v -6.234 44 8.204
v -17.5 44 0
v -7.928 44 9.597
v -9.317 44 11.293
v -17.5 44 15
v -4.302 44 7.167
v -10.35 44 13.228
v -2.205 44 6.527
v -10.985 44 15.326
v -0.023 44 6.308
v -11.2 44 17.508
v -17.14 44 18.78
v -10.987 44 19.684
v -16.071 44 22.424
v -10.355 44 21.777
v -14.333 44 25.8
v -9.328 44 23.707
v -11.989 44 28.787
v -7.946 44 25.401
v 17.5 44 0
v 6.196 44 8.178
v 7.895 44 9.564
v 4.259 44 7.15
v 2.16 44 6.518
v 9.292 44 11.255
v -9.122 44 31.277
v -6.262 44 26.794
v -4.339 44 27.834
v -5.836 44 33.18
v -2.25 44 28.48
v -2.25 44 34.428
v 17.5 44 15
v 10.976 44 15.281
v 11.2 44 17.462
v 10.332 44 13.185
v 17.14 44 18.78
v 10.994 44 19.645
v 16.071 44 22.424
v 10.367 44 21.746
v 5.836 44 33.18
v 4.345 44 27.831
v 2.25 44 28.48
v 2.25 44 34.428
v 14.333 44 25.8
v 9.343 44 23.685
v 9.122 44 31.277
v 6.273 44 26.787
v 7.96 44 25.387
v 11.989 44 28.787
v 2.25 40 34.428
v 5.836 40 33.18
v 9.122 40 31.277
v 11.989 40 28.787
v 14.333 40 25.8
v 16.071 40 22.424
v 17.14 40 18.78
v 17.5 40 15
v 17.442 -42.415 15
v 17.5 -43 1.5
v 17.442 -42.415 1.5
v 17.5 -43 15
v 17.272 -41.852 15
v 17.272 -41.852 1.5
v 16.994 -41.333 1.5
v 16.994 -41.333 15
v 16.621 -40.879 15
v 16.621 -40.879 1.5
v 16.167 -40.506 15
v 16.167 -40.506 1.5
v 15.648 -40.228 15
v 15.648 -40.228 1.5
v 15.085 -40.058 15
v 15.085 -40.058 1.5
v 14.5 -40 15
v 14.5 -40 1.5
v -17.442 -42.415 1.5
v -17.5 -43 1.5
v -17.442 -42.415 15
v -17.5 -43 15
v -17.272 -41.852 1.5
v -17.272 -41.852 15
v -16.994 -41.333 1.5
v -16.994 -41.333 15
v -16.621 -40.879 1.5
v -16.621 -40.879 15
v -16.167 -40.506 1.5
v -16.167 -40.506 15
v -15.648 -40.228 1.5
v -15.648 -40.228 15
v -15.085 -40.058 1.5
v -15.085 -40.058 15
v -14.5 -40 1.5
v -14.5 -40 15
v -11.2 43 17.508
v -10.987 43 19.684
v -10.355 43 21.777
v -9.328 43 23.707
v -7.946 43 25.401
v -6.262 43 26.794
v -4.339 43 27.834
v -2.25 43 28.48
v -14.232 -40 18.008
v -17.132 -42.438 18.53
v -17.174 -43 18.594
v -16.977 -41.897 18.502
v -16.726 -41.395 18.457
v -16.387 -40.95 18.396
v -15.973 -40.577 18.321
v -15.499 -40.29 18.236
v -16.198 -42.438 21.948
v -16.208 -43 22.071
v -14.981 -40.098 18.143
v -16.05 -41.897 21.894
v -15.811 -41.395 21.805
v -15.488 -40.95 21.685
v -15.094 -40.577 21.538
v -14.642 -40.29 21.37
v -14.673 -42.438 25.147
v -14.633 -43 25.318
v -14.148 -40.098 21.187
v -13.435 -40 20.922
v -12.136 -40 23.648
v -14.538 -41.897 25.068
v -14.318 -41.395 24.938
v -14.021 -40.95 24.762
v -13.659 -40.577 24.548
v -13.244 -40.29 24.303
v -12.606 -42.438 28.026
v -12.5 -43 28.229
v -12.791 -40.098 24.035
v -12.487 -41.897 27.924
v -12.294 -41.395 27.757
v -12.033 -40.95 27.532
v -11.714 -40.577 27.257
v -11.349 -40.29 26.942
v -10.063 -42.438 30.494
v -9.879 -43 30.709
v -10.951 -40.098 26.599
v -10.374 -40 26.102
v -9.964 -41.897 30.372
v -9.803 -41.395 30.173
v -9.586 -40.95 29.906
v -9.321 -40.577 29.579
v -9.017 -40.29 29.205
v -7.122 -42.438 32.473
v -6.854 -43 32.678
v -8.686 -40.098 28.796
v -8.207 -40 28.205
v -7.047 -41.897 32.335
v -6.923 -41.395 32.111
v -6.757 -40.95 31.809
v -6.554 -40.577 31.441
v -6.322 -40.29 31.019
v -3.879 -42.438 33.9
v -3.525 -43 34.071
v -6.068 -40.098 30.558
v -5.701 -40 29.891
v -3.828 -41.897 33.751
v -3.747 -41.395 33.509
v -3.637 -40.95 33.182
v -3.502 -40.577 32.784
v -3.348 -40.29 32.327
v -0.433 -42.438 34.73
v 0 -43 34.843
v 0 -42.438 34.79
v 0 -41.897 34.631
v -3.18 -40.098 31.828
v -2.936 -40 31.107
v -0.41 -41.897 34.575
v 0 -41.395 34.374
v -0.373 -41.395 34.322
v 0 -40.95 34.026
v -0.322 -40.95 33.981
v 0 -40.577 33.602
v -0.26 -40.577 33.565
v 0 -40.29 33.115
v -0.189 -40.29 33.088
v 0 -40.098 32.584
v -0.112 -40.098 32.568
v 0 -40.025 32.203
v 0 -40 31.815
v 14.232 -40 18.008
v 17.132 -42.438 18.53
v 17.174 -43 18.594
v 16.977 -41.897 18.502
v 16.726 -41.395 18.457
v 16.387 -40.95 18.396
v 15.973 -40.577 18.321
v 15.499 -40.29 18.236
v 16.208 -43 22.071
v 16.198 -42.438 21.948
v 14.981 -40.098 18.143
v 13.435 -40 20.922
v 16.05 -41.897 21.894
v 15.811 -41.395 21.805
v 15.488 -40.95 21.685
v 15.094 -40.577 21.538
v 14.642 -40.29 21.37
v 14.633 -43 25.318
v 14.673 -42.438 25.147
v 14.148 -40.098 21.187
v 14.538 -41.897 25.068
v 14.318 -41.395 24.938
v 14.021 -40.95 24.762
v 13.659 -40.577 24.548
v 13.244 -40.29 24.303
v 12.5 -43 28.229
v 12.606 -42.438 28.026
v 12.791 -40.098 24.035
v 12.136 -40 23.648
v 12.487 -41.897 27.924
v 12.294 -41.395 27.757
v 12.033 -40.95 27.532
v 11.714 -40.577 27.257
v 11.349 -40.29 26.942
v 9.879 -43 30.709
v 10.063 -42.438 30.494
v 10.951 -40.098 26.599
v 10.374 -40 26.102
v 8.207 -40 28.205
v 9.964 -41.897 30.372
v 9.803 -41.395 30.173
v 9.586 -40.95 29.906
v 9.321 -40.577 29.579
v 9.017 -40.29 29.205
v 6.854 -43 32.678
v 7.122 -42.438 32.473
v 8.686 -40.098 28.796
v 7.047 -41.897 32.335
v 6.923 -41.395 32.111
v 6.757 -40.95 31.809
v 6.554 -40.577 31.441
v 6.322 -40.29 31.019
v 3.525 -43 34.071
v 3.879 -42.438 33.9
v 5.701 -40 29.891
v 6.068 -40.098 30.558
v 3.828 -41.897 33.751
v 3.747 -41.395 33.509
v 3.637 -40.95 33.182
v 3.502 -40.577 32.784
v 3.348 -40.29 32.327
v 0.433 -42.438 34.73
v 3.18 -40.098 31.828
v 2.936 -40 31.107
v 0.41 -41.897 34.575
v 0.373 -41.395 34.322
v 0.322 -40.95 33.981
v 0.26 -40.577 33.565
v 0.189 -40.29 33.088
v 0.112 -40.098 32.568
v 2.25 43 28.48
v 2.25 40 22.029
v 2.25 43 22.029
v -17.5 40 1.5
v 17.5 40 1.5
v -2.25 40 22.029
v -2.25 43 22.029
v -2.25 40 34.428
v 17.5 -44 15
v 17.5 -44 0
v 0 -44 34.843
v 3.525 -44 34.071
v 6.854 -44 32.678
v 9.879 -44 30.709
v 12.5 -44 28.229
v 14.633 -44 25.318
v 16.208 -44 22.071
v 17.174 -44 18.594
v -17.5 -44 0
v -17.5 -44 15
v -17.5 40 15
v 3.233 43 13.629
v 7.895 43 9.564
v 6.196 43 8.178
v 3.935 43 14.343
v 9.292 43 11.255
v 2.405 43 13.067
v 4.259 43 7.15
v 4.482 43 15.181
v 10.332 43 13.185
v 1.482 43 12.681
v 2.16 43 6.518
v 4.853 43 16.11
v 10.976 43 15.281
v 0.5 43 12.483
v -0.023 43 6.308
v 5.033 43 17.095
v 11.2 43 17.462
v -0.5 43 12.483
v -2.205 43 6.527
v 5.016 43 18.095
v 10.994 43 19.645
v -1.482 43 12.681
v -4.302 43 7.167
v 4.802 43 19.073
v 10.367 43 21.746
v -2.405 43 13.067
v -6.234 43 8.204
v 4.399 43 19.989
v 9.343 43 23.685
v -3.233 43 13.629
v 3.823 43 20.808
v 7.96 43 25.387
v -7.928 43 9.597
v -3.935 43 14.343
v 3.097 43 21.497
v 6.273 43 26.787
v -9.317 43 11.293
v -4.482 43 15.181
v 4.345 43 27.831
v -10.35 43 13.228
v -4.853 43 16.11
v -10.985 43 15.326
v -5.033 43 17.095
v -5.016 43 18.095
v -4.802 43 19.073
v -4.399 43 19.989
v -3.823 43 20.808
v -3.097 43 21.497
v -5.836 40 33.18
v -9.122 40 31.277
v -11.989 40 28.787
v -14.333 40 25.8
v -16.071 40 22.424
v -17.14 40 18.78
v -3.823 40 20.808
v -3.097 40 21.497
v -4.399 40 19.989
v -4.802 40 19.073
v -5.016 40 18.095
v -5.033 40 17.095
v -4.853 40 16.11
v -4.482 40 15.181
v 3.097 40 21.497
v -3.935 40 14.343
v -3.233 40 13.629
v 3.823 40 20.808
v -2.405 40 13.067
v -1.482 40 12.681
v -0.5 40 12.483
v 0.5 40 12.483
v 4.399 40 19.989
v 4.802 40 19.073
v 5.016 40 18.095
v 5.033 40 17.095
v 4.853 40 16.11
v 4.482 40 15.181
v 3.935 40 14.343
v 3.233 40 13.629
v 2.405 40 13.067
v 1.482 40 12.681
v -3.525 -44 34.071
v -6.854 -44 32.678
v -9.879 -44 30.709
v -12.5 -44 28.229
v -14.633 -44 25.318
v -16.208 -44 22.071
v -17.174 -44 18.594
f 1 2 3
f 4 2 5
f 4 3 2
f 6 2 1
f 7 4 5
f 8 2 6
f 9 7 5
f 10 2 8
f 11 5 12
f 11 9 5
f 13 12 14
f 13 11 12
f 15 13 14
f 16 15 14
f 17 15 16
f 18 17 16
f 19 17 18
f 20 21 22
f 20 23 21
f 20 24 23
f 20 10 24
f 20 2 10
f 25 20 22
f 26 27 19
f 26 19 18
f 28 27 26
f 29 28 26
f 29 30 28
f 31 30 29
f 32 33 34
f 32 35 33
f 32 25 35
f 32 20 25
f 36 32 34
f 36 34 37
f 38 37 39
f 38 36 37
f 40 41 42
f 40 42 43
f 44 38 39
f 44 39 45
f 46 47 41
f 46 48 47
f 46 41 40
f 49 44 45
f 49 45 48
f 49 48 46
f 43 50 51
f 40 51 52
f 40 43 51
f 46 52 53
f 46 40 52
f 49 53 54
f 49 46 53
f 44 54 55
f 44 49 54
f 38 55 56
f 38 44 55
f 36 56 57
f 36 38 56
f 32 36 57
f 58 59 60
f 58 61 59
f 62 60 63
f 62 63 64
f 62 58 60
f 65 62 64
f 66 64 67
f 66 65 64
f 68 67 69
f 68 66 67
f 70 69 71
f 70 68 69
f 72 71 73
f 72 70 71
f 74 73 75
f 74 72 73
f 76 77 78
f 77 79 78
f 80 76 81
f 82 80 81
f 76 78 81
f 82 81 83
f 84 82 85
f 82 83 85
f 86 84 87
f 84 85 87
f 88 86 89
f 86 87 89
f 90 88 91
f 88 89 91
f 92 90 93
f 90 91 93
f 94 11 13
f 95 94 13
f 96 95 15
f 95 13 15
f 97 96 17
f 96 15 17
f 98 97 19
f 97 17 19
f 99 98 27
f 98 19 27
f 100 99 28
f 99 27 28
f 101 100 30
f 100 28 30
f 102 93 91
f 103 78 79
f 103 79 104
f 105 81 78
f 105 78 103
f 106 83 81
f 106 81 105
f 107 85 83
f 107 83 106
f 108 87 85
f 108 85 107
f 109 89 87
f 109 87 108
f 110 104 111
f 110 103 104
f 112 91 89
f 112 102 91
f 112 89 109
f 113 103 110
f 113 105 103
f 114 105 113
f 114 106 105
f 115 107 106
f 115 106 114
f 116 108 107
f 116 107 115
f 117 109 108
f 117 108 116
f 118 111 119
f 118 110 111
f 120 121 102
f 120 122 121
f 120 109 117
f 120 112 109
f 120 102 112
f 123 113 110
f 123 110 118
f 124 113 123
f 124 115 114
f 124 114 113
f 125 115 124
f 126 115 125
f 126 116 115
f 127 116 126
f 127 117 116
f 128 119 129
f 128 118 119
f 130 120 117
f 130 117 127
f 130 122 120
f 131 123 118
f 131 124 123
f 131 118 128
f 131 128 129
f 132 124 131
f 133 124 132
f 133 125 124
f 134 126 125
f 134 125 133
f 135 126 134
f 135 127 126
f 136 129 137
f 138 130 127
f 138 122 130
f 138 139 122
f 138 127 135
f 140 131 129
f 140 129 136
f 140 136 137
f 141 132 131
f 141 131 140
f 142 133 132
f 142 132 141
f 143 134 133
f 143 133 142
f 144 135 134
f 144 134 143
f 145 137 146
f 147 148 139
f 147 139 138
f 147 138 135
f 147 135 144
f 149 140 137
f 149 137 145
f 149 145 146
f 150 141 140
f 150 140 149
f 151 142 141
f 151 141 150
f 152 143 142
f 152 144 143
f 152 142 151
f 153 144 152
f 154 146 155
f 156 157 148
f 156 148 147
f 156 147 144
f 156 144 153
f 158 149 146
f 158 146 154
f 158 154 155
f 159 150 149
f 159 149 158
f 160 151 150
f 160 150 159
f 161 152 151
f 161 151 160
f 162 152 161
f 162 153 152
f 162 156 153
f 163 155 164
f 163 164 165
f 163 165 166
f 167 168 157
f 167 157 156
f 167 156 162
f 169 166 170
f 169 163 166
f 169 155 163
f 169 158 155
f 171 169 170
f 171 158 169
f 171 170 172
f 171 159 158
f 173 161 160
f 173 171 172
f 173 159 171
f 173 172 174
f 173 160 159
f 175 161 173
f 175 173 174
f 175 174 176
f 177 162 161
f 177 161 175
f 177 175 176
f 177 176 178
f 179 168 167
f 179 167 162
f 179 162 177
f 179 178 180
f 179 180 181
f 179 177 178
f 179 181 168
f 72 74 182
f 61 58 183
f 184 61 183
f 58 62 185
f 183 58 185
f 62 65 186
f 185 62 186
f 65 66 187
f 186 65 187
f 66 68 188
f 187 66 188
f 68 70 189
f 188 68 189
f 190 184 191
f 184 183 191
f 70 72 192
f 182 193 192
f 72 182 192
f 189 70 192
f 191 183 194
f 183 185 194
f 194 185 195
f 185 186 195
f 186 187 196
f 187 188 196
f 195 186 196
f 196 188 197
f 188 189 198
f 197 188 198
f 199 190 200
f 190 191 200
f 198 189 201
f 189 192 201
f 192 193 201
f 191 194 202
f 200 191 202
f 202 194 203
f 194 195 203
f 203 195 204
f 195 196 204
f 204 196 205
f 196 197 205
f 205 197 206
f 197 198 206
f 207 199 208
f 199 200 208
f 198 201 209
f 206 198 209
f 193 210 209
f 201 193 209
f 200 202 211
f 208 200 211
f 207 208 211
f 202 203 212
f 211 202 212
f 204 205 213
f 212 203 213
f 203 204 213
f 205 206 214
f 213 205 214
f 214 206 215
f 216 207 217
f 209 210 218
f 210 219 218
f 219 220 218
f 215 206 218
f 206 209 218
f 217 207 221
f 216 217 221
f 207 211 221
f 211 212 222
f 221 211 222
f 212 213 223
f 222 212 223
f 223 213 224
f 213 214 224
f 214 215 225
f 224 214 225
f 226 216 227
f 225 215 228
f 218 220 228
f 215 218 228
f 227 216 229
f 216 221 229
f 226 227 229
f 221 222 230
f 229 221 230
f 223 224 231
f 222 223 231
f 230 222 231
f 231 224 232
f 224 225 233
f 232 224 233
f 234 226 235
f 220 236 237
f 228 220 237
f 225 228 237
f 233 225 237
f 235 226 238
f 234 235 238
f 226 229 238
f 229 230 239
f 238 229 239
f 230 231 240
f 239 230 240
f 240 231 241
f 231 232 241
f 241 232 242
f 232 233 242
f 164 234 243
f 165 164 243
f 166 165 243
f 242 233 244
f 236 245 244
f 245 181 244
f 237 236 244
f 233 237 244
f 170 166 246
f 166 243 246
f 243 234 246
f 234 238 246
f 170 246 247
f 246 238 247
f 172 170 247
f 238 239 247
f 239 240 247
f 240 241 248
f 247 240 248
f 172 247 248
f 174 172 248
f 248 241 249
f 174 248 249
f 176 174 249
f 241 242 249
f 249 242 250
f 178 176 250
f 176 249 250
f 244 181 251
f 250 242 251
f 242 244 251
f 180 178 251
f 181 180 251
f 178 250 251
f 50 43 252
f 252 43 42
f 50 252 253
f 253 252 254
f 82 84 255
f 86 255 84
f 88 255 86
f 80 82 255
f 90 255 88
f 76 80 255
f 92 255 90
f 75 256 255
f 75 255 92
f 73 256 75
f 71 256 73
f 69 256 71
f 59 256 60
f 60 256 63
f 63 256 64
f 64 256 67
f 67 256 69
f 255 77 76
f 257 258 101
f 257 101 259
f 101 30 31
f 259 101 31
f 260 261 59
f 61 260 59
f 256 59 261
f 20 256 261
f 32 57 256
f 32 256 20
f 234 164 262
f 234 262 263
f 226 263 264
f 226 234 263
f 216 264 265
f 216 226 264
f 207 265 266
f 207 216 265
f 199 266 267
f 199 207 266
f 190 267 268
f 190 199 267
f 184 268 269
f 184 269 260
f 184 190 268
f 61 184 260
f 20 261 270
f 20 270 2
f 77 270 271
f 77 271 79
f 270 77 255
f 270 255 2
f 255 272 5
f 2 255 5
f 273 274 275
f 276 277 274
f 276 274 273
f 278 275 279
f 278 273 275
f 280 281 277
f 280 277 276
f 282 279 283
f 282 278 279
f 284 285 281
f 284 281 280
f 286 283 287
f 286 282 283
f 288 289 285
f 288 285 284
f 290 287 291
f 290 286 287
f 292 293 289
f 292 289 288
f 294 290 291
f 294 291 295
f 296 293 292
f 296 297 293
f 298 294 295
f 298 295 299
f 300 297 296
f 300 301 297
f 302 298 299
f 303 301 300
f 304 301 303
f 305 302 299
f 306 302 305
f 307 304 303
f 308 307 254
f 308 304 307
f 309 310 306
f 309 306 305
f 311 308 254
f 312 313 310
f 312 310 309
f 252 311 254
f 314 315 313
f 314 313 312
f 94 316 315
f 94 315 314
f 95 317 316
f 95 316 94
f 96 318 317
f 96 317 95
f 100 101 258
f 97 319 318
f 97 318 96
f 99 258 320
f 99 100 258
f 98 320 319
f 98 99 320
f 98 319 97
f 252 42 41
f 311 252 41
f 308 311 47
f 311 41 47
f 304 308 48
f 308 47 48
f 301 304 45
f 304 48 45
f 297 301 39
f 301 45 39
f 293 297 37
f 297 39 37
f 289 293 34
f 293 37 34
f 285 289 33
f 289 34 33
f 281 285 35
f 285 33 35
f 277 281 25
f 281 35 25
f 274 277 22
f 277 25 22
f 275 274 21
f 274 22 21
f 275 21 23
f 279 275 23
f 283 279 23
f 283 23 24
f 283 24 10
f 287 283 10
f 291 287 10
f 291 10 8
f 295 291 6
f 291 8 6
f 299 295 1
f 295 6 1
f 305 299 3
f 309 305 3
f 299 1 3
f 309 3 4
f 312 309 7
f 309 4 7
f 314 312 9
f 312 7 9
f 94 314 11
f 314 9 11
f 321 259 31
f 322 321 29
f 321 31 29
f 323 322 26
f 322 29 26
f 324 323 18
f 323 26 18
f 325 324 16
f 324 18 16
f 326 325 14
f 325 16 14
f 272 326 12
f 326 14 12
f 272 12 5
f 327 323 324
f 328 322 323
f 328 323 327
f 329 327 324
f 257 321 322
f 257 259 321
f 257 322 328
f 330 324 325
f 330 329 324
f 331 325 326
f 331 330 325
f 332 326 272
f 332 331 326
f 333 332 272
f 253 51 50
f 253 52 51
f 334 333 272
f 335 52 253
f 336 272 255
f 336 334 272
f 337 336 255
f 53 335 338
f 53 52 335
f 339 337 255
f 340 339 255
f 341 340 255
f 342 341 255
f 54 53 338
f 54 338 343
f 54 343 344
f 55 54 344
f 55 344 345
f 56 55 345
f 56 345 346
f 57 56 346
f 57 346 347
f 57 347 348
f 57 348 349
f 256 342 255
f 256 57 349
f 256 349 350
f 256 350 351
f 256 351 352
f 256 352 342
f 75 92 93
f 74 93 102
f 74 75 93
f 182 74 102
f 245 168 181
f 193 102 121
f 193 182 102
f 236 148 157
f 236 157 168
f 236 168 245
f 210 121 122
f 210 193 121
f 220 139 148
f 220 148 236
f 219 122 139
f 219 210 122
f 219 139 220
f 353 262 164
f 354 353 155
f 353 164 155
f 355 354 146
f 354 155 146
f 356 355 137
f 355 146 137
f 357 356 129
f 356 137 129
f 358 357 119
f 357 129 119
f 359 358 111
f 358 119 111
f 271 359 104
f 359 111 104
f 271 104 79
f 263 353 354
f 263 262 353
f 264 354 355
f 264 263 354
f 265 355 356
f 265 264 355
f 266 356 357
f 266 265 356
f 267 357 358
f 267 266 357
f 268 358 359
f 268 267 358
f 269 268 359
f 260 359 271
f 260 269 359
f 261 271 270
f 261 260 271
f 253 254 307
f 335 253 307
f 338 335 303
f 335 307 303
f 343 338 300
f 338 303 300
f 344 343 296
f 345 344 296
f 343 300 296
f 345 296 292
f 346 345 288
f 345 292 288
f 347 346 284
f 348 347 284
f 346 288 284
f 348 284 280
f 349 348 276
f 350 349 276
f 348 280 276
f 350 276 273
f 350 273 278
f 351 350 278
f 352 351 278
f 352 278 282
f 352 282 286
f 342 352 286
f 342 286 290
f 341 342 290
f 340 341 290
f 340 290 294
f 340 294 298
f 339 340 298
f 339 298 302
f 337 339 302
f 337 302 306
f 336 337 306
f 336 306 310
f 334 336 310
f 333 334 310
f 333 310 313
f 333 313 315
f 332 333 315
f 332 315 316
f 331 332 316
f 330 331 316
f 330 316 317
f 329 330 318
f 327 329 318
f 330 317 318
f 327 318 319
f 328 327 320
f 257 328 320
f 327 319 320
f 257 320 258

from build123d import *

# Parameters (mm, degrees)
F1_DEPTH    = 17.5
F2_T1_DEPTH = 104
F2_T3_DEPTH = 104
F4_DEPTH    = 1
F5_DEPTH    = 25
F6_R        = 3


# Not quite as in the source:
# - a fillet or chamfer that OpenCascade refuses, or shapes differently, is made with other operations: its cross-section is extruded or revolved along the edge and cut away or added


with BuildPart() as f1:
    # F0 (on Right) → F1 (new body, symmetric)
    with BuildSketch(Plane.YZ):
        Polygon((-44, 35), (-44, 0), (44, 0), (44, 35), (40, 35), (40, 1.5), (-40, 1.5), (-40, 35), align=None)
    extrude(amount=F1_DEPTH, both=True)

    # F2: fillet of radius 20 on 4 edges, made by hand

    # F2_s2 → F2_t1 (cut)
    with BuildSketch(Plane.XZ.offset(-94)):
        with BuildLine():
            ThreePointArc((-2.5, 35), (11.6421356237, 29.1421356237), (17.5, 15))
            Line((17.5, 15), (17.5, 35))
            Line((17.5, 35), (-2.5, 35))
        make_face()
        with BuildLine():
            ThreePointArc((2.5, 35), (-11.6421356237, 29.1421356237), (-17.5, 15))
            Line((-17.5, 15), (-17.5, 35))
            Line((-17.5, 35), (2.5, 35))
        make_face()
    extrude(amount=F2_T1_DEPTH, mode=Mode.SUBTRACT)

    # F2_s4 → F2_t3 (cut)
    with BuildSketch(Plane.XZ.offset(-10)):
        with BuildLine():
            ThreePointArc((2.5, 35), (-11.6421356237, 29.1421356237), (-17.5, 15))
            Line((-17.5, 15), (-17.5, 35))
            Line((-17.5, 35), (2.5, 35))
        make_face()
        with BuildLine():
            ThreePointArc((-2.5, 35), (11.6421356237, 29.1421356237), (17.5, 15))
            Line((17.5, 15), (17.5, 35))
            Line((17.5, 35), (-2.5, 35))
        make_face()
    extrude(amount=F2_T3_DEPTH, mode=Mode.SUBTRACT)

    # F3 (on face) → F4 (cut)
    with BuildSketch(Plane(origin=(0, 44, 0), x_dir=(-1, 0, 0), z_dir=(0, 1, 0))):
        with BuildLine():
            Line((2.25, 22.0293655688), (2.25, 28.4799718057))
            ThreePointArc((2.25, 28.4799718057), (0, 28.7083037466), (-2.25, 28.4799718057))
            Line((-2.25, 28.4799718057), (-2.25, 22.0293655688))
            ThreePointArc((-2.25, 22.0293655688), (0, 12.4583037466), (2.25, 22.0293655688))
        make_face()
        with BuildLine():
            ThreePointArc((-2.25, 28.4799718057), (-7.0795480082, 8.8295941651), (11.2, 17.5083037466))
            ThreePointArc((11.2, 17.5083037466), (8.6787095815, 24.5878517548), (2.25, 28.4799718057))
            Line((2.25, 28.4799718057), (2.25, 22.0293655688))
            ThreePointArc((2.25, 22.0293655688), (0, 12.4583037466), (-2.25, 22.0293655688))
            Line((-2.25, 22.0293655688), (-2.25, 28.4799718057))
        make_face()
    extrude(amount=-F4_DEPTH, mode=Mode.SUBTRACT)

    # F3 (on face) → F5 (cut)
    with BuildSketch(Plane(origin=(0, 44, 0), x_dir=(-1, 0, 0), z_dir=(0, 1, 0))):
        with BuildLine():
            Line((2.25, 22.0293655688), (2.25, 28.4799718057))
            ThreePointArc((2.25, 28.4799718057), (0, 28.7083037466), (-2.25, 28.4799718057))
            Line((-2.25, 28.4799718057), (-2.25, 22.0293655688))
            ThreePointArc((-2.25, 22.0293655688), (0, 12.4583037466), (2.25, 22.0293655688))
        make_face()
        with BuildLine():
            ThreePointArc((-2.25, 28.4799718057), (0, 28.7083037466), (2.25, 28.4799718057))
            Line((2.25, 28.4799718057), (2.25, 34.4277507705))
            ThreePointArc((2.25, 34.4277507705), (1.1309449156, 34.6676444705), (0, 34.843134833))
            ThreePointArc((0, 34.843134833), (-1.1309449156, 34.6676444705), (-2.25, 34.4277507705))
            Line((-2.25, 34.4277507705), (-2.25, 28.4799718057))
        make_face()
    extrude(amount=-F5_DEPTH, mode=Mode.SUBTRACT)

    # F6
    f6_edges = [f1.edges().sort_by_distance(p)[0] for p in [
        (17.5, -40, 8.25),
        (-17.5, -40, 8.25),
    ]]
    fillet(f6_edges, radius=F6_R)


solid = f1.part
